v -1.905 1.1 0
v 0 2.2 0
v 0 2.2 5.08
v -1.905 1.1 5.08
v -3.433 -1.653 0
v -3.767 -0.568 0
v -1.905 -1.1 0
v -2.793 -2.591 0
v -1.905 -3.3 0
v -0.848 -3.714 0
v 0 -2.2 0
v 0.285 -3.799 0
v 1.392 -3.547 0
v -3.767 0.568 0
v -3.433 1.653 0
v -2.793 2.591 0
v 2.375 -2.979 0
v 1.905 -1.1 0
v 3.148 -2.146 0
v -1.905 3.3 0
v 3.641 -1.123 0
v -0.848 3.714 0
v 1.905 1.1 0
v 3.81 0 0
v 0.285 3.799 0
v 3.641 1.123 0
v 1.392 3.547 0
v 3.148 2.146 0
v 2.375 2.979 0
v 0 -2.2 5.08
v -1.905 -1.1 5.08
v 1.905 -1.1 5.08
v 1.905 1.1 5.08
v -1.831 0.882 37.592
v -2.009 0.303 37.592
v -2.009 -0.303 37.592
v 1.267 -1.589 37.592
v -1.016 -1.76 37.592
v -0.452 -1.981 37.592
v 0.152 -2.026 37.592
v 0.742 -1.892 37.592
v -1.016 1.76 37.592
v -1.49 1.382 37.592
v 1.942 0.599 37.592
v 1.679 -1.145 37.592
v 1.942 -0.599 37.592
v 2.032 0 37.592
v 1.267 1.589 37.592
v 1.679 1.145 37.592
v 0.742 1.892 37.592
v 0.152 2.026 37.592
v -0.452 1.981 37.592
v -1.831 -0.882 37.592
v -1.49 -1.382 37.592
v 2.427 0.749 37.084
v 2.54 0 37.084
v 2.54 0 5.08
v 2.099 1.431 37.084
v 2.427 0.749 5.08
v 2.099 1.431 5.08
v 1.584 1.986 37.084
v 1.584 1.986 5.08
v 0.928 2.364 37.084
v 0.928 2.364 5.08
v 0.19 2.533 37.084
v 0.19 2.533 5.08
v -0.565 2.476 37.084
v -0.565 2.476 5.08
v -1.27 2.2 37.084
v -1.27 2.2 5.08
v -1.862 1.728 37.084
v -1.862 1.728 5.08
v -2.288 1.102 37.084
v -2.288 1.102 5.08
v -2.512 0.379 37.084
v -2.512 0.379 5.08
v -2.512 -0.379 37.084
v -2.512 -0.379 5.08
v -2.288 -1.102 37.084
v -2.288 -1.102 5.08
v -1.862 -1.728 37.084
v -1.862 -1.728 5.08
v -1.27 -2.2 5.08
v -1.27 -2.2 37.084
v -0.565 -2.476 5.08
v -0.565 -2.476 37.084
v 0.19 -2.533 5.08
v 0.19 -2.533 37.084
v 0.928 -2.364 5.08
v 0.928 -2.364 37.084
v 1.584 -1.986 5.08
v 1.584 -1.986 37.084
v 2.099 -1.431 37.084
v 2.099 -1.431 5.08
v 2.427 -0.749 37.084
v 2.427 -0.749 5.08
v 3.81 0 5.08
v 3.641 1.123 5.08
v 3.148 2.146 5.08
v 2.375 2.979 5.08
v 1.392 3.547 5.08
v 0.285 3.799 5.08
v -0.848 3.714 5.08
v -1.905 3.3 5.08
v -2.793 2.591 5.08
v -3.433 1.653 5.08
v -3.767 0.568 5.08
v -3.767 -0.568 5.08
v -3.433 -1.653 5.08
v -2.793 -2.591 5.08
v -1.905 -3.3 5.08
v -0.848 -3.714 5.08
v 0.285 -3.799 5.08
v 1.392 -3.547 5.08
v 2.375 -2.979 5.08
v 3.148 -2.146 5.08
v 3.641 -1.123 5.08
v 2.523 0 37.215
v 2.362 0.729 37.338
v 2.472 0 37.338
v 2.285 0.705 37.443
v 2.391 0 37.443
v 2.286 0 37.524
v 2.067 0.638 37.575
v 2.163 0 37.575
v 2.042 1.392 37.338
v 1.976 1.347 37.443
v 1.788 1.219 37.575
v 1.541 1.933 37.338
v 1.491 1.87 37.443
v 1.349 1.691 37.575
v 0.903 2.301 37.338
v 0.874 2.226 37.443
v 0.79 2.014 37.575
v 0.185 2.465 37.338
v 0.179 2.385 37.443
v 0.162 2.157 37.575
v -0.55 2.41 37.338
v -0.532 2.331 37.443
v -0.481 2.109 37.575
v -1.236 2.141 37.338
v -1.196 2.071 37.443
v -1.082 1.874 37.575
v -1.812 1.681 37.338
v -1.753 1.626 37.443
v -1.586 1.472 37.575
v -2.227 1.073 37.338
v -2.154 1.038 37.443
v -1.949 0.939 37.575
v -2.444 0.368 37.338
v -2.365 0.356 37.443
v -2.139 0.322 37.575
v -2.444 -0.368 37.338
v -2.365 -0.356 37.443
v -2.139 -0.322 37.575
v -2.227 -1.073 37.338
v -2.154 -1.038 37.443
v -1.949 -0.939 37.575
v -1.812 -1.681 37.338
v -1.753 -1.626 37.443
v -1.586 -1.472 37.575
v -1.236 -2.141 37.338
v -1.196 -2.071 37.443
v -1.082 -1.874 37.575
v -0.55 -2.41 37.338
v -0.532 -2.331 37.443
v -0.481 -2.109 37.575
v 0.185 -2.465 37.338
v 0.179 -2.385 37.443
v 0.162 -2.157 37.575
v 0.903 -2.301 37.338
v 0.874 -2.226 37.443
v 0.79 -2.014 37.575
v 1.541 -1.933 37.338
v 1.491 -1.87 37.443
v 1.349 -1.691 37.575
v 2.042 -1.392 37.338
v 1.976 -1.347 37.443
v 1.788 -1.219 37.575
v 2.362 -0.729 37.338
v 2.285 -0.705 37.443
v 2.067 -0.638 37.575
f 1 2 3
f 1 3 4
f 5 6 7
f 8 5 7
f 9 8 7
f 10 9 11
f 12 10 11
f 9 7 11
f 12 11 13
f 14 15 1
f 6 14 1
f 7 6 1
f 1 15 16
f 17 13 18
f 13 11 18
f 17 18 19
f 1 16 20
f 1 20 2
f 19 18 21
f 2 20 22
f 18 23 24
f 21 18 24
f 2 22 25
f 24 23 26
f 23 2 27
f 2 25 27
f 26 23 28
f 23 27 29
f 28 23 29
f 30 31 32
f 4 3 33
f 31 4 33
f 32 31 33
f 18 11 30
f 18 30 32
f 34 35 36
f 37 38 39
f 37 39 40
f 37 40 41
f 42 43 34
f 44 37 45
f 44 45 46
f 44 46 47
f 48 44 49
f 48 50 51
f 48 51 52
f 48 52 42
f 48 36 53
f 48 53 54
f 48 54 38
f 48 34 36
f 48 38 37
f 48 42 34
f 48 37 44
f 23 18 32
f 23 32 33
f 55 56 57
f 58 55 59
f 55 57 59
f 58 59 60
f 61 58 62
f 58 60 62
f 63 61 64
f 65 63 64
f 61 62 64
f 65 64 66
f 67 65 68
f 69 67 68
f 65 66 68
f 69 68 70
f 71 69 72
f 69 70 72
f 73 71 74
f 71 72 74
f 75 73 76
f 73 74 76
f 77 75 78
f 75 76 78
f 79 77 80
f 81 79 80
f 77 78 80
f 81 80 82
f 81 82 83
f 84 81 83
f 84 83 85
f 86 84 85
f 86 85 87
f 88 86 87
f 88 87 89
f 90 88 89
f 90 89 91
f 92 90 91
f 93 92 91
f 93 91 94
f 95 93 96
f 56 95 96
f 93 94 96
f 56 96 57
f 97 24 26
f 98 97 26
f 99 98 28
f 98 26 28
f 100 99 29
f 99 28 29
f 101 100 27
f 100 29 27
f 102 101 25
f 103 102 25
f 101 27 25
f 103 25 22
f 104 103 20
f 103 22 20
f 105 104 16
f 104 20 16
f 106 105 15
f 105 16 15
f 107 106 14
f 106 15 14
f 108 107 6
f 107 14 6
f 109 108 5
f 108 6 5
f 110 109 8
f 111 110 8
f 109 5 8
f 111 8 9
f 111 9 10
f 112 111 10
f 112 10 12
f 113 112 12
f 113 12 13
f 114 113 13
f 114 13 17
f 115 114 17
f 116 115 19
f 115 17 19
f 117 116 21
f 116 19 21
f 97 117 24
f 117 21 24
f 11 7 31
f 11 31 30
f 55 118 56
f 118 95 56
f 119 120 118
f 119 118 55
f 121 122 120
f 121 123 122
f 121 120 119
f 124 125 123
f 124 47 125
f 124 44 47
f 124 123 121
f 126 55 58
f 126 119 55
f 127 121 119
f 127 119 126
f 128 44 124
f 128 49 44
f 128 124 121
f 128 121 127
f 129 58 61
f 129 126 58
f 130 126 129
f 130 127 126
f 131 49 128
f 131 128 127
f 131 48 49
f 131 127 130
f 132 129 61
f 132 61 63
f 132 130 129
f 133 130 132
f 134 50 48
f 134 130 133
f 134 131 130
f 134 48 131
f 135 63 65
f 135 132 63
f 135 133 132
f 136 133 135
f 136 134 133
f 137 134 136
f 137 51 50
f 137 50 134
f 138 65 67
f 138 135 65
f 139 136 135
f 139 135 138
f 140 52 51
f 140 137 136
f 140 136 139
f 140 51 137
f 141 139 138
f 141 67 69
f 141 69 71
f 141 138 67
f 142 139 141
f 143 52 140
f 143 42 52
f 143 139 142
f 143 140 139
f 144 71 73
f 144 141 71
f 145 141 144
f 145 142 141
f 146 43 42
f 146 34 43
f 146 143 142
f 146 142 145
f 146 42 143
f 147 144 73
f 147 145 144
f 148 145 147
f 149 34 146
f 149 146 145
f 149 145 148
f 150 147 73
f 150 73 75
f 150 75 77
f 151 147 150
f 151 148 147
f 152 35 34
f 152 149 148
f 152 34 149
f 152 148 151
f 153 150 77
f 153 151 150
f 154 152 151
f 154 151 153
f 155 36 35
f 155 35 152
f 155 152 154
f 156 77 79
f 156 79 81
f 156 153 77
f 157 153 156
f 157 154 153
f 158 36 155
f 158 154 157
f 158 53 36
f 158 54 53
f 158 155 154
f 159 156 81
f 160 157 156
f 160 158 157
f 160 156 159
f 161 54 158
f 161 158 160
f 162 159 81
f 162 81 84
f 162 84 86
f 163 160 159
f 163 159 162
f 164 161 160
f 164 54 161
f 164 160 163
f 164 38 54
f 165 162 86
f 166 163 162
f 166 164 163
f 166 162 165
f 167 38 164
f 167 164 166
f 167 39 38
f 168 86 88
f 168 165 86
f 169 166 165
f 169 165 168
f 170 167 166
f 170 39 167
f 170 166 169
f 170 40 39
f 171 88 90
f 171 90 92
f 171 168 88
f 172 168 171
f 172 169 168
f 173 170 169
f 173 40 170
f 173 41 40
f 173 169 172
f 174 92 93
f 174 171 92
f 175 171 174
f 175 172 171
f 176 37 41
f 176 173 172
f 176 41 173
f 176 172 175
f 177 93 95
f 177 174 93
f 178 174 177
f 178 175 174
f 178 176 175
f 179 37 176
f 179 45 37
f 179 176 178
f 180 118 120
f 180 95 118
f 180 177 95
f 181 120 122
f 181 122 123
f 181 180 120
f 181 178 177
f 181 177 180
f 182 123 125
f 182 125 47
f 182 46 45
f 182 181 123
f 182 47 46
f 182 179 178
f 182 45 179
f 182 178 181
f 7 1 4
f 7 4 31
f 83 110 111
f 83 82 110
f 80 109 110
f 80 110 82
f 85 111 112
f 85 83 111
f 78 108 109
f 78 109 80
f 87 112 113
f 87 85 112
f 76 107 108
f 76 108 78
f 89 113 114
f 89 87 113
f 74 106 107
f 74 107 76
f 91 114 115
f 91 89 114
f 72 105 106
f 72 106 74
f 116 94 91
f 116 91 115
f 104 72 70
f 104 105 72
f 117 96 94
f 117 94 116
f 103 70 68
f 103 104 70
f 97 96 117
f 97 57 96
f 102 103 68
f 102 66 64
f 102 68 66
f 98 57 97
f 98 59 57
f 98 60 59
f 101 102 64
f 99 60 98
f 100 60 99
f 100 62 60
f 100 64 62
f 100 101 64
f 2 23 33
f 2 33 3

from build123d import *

# Parameters (mm, degrees)
SKETCH1_R           = 3.81
BOSS_EXTRUDE1_DEPTH = 5.08
SKETCH2_R           = 2.54
BOSS_EXTRUDE2_DEPTH = 32.512
FILLET1_R           = 0.508


with BuildPart() as part:
    # Sketch1 → Boss-Extrude1 (new body)
    with BuildSketch(Plane.XY):
        Circle(SKETCH1_R)
        Polygon((1.905, 1.099852263), (0, 2.199704526), (-1.905, 1.099852263), (-1.905, -1.099852263), (0, -2.199704526), (1.905, -1.099852263), align=None, mode=Mode.SUBTRACT)
    extrude(amount=BOSS_EXTRUDE1_DEPTH)

    # Sketch2 → Boss-Extrude2 (add)
    with BuildSketch(Plane.XY.offset(5.08)):
        Circle(SKETCH2_R)
    extrude(amount=BOSS_EXTRUDE2_DEPTH)

    # Fillet1
    fillet1_edges = [part.edges().sort_by_distance(p)[0] for p in [
        (-2.54, 0, 37.592),
    ]]
    fillet(fillet1_edges, radius=FILLET1_R)


solid = part.part
